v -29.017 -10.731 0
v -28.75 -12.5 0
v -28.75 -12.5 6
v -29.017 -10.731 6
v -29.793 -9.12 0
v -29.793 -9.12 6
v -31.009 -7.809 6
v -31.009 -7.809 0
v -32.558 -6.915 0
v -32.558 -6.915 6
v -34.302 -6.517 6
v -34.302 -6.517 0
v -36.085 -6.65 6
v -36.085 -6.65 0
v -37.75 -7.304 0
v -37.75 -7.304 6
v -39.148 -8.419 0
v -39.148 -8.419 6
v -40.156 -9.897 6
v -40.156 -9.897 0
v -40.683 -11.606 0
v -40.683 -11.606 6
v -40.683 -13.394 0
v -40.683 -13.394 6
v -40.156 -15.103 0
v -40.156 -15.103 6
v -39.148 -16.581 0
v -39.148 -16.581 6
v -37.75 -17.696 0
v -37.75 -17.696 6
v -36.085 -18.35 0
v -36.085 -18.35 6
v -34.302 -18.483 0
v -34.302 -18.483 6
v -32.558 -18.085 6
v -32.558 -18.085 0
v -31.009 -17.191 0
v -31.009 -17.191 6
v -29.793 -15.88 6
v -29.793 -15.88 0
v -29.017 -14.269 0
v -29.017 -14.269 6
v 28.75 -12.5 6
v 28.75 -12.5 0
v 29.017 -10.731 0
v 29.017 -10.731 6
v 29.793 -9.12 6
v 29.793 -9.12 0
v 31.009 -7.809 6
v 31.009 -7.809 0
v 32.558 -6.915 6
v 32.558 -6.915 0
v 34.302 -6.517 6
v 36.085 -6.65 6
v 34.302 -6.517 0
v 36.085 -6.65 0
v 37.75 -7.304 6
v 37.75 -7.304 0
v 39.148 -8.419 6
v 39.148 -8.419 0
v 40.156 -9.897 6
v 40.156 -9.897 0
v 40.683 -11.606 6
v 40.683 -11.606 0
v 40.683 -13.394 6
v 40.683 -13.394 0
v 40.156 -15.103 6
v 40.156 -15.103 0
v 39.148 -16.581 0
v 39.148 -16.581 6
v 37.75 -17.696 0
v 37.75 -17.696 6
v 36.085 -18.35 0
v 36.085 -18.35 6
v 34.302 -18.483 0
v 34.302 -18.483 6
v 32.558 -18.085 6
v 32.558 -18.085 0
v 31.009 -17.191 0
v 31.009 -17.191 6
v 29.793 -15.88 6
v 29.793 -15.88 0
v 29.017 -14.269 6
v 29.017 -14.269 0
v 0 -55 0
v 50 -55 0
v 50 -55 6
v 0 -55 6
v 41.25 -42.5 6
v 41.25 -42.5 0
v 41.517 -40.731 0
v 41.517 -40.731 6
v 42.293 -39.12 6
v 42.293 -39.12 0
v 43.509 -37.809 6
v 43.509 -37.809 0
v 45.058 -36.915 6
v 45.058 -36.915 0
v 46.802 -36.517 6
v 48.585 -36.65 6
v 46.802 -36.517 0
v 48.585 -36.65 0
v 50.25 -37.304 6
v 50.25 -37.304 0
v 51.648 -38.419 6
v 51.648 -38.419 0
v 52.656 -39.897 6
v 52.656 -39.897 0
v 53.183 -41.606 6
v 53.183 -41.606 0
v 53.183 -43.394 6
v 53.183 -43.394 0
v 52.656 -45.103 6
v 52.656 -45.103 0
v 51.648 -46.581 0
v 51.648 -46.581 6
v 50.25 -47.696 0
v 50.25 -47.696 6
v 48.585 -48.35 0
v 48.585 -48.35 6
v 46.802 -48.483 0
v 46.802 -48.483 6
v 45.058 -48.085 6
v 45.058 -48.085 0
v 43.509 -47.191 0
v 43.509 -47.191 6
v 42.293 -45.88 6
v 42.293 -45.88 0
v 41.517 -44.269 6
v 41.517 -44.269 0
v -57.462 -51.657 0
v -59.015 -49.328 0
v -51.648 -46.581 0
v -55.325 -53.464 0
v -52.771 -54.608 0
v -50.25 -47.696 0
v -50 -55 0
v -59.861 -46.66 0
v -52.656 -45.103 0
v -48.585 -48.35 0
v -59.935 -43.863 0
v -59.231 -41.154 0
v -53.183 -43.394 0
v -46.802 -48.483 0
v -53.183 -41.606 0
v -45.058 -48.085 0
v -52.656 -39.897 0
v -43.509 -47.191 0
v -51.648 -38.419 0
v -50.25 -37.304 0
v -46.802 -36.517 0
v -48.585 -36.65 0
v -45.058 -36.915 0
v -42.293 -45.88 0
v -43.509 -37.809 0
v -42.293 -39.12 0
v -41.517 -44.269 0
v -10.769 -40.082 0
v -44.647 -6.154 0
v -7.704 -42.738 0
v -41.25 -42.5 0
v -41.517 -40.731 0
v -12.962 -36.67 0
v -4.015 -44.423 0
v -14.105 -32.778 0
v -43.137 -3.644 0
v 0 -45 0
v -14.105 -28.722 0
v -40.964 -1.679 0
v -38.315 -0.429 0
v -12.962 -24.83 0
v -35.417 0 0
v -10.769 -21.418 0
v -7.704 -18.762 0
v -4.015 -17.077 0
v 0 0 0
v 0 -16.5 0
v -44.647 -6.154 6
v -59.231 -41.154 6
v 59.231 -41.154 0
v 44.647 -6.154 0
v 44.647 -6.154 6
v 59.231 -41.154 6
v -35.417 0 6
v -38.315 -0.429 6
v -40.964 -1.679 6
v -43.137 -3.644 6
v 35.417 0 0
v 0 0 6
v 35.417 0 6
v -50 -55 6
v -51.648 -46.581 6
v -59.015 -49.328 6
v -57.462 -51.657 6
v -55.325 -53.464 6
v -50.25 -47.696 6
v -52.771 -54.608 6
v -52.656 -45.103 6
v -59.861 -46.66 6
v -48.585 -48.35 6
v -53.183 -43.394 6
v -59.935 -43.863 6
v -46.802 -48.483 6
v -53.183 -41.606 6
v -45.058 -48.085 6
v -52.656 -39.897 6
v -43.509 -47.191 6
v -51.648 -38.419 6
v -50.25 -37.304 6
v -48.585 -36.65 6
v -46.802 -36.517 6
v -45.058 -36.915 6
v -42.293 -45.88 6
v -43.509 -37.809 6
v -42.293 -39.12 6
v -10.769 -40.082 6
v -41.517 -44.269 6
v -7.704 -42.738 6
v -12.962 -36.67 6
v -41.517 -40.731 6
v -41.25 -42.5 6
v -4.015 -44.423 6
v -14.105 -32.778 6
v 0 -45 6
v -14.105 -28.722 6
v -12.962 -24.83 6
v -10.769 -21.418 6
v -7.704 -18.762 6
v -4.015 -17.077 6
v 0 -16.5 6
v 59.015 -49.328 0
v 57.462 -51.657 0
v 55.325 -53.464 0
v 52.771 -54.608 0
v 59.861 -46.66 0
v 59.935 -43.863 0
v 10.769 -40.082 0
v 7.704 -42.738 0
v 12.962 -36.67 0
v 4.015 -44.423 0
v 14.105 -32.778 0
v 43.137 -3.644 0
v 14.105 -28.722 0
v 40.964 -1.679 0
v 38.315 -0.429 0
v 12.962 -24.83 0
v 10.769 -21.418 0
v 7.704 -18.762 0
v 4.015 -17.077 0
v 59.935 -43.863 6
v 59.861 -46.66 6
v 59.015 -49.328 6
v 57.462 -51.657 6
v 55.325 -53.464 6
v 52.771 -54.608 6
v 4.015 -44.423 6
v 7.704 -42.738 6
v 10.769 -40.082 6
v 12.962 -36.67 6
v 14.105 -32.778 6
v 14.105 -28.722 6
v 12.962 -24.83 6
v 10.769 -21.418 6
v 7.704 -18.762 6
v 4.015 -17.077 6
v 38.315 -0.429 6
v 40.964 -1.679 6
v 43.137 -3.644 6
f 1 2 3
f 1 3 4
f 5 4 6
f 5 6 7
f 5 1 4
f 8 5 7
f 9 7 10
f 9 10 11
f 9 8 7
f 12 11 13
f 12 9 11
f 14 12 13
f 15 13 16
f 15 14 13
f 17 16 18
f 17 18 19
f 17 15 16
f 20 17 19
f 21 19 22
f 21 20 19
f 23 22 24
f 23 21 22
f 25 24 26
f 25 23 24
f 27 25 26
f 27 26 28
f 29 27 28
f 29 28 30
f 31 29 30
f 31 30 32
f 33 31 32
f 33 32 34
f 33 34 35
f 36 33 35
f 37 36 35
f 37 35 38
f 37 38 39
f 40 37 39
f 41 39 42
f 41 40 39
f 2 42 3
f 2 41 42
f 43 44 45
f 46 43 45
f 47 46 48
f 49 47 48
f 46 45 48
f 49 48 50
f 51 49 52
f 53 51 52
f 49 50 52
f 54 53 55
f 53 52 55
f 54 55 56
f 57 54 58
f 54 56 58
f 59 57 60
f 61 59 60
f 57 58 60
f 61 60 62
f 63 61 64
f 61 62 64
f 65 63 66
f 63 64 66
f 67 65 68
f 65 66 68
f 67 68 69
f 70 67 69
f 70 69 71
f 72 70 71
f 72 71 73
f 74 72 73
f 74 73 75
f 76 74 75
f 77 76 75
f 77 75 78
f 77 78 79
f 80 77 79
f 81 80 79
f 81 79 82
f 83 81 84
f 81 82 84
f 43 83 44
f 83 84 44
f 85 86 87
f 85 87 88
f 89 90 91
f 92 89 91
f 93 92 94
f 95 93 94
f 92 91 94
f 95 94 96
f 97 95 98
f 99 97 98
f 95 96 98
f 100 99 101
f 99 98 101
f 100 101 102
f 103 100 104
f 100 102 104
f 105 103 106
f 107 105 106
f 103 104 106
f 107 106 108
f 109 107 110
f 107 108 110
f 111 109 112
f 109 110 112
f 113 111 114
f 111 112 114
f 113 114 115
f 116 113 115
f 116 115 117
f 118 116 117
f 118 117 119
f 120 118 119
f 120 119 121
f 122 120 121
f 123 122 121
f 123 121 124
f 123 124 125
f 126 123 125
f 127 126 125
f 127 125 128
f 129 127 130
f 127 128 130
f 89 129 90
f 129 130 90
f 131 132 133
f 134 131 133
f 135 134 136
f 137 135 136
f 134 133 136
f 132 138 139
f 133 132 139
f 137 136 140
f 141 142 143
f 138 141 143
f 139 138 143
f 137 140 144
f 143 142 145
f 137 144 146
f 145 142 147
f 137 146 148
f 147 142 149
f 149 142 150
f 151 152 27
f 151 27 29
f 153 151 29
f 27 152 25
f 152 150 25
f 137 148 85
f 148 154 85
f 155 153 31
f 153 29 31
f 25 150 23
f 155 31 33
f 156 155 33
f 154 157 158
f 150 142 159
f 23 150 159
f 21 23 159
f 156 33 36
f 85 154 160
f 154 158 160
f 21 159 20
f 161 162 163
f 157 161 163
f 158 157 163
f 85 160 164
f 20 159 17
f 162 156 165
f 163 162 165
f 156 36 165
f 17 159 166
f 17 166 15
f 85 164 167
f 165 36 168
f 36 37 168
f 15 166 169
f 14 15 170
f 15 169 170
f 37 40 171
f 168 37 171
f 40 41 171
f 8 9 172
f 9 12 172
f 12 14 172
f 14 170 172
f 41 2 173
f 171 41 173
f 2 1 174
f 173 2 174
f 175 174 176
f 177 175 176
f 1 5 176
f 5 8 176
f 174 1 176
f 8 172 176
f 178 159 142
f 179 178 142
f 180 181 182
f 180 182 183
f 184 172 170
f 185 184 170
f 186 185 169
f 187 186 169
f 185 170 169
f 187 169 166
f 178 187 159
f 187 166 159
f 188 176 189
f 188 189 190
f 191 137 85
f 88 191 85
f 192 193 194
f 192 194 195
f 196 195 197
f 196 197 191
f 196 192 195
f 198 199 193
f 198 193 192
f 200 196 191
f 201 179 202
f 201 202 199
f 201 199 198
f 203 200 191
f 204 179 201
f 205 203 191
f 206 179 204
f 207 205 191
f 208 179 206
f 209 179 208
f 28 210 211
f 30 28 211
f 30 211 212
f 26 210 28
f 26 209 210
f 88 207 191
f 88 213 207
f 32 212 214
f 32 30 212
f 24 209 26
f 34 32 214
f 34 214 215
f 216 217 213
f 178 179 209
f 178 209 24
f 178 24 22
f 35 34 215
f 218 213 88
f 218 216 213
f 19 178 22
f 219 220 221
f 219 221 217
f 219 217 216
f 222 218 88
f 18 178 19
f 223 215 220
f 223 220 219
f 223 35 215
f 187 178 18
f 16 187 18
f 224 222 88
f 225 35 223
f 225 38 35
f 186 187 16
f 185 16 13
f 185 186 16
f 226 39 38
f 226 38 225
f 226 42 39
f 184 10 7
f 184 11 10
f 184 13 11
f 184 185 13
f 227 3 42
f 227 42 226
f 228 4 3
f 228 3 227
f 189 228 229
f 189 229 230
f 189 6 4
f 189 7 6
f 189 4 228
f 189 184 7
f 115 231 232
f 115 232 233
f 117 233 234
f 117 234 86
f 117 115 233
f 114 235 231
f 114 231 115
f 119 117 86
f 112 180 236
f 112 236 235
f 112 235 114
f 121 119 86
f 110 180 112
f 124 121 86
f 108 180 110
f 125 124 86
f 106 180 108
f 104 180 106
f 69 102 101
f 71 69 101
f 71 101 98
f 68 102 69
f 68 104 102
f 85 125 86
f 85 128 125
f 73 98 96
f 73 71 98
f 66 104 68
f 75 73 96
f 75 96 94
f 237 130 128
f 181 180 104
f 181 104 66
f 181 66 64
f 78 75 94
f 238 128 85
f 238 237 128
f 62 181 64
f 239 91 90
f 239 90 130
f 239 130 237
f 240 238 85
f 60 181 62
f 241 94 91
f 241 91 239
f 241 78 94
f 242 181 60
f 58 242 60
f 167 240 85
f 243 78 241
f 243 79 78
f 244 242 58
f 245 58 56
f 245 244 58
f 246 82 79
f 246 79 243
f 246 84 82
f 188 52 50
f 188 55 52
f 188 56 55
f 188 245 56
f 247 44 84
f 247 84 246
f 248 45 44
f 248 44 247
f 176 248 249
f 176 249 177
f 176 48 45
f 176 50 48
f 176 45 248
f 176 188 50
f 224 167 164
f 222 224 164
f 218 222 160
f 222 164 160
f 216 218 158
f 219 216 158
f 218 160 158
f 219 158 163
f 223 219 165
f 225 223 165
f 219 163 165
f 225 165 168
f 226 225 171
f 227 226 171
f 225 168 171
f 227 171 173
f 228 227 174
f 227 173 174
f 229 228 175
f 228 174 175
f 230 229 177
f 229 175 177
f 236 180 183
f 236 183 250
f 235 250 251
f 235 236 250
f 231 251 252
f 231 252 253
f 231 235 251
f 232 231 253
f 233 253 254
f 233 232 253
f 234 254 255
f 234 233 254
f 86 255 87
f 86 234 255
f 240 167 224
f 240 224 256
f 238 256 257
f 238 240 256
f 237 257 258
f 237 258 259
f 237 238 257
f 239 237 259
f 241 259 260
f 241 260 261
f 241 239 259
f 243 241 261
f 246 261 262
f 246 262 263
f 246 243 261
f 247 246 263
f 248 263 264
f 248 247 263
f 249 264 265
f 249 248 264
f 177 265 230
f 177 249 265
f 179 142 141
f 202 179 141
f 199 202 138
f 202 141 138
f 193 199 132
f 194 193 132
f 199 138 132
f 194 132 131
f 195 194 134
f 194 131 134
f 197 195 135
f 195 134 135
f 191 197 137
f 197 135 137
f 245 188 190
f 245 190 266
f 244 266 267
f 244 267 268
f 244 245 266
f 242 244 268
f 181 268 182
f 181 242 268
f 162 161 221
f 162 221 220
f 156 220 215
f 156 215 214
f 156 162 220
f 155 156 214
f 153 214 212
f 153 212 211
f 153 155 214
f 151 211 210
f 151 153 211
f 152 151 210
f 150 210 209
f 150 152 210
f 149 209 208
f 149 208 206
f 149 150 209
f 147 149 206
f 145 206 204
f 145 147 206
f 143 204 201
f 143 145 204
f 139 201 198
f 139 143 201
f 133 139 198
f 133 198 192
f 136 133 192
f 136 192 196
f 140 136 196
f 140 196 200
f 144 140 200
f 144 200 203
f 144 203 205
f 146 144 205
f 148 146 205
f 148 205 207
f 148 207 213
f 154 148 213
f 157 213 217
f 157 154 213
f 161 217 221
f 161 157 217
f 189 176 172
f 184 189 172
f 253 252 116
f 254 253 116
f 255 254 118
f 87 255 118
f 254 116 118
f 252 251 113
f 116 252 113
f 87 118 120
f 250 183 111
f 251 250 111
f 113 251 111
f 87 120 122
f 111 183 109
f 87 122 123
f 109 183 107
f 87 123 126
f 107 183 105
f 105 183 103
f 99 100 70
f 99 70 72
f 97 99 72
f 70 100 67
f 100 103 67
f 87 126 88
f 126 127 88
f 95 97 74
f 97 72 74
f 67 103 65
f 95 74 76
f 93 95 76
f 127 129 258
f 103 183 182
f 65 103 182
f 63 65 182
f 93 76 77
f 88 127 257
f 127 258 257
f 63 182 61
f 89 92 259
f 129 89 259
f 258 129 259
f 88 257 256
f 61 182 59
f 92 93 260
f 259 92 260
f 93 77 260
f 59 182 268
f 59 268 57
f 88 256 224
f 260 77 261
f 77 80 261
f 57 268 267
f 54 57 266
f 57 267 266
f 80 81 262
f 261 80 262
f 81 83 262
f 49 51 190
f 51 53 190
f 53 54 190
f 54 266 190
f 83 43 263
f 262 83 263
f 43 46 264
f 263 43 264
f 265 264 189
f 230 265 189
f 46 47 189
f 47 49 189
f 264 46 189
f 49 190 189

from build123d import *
from build123d import SkipClean  # not in build123d's __all__

# Parameters (mm, degrees)
F0_R     = 6
F1_DEPTH = 6


with BuildPart() as f1:
    # F0 (on Top) → F1 (new body)
    with BuildSketch(Plane.XY):
        with BuildLine():
            Line((0, -16.5), (0, 0))
            Line((0, 0), (-35.4166666667, 0))
            ThreePointArc((-35.4166666667, 0), (-40.9636686289, -1.6794970566), (-44.6474358974, -6.1538461538))
            Line((-44.6474358974, -6.1538461538), (-59.2307692308, -41.1538461538))
            ThreePointArc((-59.2307692308, -41.1538461538), (-58.3205029434, -50.5470019623), (-50, -55))
            Line((-50, -55), (0, -55))
            Line((0, -55), (0, -45))
            ThreePointArc((0, -45), (-14.25, -30.75), (0, -16.5))
        make_face()
        with Locations((-47.25, -42.5)):
            Circle(F0_R, mode=Mode.SUBTRACT)
        with Locations((-34.75, -12.5)):
            Circle(F0_R, mode=Mode.SUBTRACT)
    extrude(amount=F1_DEPTH)

    # F2: F1 across plane


with BuildPart() as f1_1:
    add(f1.part, clean=False)
    with SkipClean():  # cleaning this boolean's faces spoils the solid; the shape is the same uncleaned
        add(f1.part.mirror(Plane.YZ), clean=False)


solid = f1_1.part
